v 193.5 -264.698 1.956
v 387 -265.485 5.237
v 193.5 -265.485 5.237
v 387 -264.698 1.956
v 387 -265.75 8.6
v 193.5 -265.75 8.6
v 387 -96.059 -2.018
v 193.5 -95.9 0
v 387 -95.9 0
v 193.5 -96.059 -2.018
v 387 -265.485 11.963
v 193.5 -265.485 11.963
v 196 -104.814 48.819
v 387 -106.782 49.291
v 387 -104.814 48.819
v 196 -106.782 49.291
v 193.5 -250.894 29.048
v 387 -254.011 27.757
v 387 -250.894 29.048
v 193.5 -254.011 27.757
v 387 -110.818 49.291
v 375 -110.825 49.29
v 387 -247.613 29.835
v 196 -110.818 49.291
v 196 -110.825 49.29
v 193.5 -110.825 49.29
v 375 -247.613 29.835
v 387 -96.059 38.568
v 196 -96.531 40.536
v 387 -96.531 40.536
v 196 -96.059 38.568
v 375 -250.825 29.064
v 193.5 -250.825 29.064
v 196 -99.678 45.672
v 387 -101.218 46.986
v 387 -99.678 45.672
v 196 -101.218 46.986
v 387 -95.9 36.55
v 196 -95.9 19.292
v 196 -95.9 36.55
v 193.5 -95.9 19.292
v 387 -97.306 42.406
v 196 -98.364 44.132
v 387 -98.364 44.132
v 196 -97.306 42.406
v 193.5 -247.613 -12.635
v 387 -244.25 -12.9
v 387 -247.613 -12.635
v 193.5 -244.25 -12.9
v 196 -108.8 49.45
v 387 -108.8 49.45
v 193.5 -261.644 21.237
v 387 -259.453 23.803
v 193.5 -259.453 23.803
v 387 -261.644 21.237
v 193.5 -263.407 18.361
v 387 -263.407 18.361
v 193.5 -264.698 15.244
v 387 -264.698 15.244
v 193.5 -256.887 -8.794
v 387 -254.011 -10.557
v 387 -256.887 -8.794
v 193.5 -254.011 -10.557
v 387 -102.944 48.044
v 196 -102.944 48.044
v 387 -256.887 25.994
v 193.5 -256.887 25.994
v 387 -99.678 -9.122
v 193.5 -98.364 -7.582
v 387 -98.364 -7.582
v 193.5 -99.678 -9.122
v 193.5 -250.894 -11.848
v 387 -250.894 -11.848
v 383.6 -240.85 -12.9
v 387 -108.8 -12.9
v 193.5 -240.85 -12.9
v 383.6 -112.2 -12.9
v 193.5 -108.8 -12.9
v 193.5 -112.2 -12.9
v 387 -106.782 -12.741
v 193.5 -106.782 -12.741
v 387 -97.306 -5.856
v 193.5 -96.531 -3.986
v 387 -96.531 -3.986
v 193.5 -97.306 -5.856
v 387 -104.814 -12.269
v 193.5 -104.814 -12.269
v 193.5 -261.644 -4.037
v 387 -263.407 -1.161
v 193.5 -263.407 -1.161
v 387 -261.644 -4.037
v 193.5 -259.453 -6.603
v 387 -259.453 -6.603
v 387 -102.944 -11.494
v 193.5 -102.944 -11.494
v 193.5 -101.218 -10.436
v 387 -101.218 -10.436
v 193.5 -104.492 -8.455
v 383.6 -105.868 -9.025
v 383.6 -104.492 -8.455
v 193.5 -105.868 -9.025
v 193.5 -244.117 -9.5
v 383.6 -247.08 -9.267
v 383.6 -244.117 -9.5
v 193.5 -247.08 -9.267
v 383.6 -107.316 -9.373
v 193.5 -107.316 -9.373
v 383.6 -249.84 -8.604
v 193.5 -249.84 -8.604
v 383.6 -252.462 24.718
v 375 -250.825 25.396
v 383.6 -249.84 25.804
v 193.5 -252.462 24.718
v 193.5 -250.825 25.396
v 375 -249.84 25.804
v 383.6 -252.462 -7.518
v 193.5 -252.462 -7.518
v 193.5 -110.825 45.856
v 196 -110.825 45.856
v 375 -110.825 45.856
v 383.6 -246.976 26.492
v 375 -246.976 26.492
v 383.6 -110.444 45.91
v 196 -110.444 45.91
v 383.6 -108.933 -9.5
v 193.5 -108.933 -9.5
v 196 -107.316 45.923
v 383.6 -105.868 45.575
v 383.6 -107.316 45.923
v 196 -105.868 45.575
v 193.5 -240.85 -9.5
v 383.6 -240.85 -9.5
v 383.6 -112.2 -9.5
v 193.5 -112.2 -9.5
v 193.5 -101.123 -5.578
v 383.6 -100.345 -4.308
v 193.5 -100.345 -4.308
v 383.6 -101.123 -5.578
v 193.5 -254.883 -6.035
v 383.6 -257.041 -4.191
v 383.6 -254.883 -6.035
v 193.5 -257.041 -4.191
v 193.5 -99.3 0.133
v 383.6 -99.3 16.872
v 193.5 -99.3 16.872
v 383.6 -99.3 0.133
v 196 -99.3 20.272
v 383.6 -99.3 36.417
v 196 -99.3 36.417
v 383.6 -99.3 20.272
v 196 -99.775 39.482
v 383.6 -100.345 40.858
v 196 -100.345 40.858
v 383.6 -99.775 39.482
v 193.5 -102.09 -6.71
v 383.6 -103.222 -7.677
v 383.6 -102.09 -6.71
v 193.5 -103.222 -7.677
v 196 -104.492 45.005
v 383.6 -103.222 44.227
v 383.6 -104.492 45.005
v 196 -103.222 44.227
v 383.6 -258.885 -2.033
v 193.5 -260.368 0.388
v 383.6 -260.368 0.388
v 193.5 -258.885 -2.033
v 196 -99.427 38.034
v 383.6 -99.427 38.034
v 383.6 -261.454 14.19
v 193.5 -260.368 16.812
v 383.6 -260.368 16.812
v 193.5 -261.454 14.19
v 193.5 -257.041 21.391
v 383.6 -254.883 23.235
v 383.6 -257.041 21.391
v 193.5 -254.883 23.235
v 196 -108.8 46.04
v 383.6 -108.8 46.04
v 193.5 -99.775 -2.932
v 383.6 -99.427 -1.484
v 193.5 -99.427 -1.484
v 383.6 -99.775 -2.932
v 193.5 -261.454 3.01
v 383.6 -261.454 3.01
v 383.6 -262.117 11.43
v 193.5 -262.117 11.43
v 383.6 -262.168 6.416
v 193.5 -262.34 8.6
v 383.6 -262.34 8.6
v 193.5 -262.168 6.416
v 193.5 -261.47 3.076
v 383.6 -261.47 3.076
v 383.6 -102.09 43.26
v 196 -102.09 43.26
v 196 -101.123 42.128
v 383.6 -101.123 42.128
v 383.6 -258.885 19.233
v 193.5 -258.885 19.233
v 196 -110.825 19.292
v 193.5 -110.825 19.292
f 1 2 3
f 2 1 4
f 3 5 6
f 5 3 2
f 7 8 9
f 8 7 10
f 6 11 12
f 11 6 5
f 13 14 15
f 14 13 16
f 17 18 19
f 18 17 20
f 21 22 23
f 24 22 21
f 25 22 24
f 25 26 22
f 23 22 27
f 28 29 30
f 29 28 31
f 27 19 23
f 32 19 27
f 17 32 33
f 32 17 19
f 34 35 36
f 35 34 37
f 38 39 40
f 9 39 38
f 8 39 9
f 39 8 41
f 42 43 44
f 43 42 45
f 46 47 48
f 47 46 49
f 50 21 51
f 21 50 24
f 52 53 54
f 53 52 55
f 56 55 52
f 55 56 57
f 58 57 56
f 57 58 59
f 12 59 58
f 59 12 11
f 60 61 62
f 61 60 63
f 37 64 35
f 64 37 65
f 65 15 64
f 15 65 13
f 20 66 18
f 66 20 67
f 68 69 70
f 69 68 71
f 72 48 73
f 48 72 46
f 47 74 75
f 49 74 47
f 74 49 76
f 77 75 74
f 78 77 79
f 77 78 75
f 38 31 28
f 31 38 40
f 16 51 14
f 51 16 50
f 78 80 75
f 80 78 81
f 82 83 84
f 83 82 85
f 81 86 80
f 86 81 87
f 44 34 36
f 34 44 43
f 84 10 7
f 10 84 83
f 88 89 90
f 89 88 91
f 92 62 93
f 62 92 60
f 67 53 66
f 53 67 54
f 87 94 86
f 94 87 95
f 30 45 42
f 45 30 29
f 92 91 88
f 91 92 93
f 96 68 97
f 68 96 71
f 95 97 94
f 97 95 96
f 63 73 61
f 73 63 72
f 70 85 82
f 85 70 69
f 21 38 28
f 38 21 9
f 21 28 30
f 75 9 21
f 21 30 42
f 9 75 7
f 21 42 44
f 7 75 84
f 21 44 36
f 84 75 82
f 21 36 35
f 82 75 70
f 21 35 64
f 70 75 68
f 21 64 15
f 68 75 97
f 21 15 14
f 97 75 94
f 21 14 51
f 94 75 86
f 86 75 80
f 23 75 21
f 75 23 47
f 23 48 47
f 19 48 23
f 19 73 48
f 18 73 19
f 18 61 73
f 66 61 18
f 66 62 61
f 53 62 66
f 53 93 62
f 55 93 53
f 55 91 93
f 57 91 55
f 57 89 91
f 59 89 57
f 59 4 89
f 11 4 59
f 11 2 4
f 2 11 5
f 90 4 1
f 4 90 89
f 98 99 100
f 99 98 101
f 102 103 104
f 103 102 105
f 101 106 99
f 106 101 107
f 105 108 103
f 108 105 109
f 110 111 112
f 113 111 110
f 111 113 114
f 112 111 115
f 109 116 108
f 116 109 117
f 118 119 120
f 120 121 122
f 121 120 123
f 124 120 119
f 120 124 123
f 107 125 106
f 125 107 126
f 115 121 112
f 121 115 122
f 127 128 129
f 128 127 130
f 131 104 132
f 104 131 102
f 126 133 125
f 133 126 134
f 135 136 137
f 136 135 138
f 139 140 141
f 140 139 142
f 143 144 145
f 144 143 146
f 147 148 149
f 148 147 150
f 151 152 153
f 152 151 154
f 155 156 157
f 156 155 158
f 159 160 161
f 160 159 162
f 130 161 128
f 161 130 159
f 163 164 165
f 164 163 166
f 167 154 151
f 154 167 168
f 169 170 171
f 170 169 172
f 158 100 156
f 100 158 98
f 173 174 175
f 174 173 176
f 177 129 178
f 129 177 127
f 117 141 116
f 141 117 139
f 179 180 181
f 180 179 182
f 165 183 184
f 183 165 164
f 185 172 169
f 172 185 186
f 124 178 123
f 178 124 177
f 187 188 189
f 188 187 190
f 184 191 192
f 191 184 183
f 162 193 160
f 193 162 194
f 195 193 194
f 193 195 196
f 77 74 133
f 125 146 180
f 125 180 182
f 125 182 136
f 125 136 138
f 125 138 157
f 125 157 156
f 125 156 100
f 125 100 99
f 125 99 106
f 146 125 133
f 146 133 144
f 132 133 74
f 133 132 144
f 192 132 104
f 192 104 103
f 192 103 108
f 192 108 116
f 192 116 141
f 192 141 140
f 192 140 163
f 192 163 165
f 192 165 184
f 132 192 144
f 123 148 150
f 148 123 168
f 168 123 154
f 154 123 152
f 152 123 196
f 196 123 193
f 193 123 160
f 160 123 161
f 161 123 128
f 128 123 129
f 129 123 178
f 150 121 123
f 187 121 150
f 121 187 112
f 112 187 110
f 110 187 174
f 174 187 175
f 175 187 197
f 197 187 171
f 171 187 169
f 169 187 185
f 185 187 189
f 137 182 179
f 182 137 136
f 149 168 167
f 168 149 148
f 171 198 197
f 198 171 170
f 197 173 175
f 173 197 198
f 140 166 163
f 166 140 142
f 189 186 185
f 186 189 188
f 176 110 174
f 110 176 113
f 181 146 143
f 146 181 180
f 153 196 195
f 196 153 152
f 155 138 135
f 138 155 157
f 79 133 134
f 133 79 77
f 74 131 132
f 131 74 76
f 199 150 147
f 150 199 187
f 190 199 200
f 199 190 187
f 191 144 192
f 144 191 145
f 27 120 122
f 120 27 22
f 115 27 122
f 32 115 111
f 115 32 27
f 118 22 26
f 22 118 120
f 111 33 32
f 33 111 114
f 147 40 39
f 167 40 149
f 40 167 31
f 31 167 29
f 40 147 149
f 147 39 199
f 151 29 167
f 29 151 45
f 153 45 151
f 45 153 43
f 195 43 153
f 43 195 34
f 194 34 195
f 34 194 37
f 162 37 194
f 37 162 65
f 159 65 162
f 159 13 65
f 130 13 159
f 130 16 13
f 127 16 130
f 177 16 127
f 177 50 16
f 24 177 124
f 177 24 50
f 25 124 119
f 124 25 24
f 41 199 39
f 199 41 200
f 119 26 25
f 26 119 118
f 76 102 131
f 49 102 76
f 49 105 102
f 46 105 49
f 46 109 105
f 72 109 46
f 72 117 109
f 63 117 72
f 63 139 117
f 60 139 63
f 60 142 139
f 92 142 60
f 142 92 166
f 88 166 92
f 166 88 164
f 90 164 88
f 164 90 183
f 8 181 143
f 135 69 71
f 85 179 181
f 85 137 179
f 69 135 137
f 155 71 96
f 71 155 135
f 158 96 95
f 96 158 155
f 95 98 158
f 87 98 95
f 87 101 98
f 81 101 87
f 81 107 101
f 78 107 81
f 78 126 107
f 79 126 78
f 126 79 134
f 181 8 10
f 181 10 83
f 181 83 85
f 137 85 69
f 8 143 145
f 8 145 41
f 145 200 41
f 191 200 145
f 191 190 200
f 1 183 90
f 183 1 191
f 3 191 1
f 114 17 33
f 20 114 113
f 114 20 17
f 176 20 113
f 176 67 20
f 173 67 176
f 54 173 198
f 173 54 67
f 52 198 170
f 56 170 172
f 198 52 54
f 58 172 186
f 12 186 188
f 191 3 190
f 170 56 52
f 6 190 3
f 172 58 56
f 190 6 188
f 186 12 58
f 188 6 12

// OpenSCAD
$fn=40;

//Header include modules here
//include <module.scad>;

// ---------------------------------------------------------------------------
// What to build.  "assembly" for the screen, the rest for exporting STLs.
// ---------------------------------------------------------------------------
// "assembly" | "case" (all four quadrants) | "whole" (the shell unsplit,
// for checking) | "lowerleft" | "lowerright" | "upperleft" | "upperright"
// | "bezel" | "panel" | "keyboard" | "kbleft" | "kbright"
part = "assembly";

// Parts are built where they live in the case, and the rear face leans back
// 0.513 deg, so the access door comes out as a flat plate that is not square to
// any axis.  Export it as-is, stand it up with a plain 90 deg rotation in the
// slicer, and one edge ends up 1.88mm off the bed.  Set this true when you go to
// print the door and it comes out lying on the bed, outer face down.
layFlat = false;

// Either selector on its own will isolate a part -- they do the same job.
// part = ...          picks a part by name
// current_color = ... picks it by the filament it prints in
//current_color = "ALL";     // everything
//current_color = "gray";    // shell, lower left
//current_color = "green";   // shell, lower right
//current_color = "blue";    // shell, upper left
//current_color = "red";     // shell, upper right
//current_color = "black";   // the screen bezel
//current_color = "white";   // the rear access door
//current_color = "orange";  // keyboard, left half
current_color = "yellow";  // keyboard, right half
// left/right are as you look at the front.  Set all four of quadColor at the
// bottom to "gray" if you want a plain preview instead of the harlequin.

//User Variables
scaleFactor = 4.3;

// Wall thickness, in FINAL mm, even all over.  3.4 is what the front wall
// happened to be before, so the bezel and its detent balls are unaffected.
wallThickness = 3.4;

// The screen aperture, in FINAL mm.  Note this is NOT an un scaled up
// dimension like the ones below it -- measure the panel and type the number
// straight in.  (It used to be [50, 36.5] un scaled up, i.e. 215 x 156.95.)
screenSize = [213, 160];       // viewable area of the LCD

// The circles the main profile is hulled from, un scaled up, as [depth, height].
// A face of the shape is the common tangent of two of these, so moving one moves
// a whole surface -- everything in "Derived" below is worked out from them.
//
// cRearTop used to be at 23, which put the back 0.51 deg off vertical: for a
// tangent to be vertical both circles have to reach the same depth, and
// 23 + 5.5 = 28.5 fell 0.5 short of 26 + 3 = 29.  At 23.5 the back is square to
// the base.  (Widening it to r = 6 at x = 23 would do the same job, but that
// changes the top rear corner radius, and 5.5 matches the front top corner.)
rSmall    = 3;
rBig      = 5.5;
cFrontBot = [  0,    0];
cRearBot  = [ 26,    0];
cRearTop  = [ 23.5, 56];
cFrontTop = [  0,   60];
cNose     = [-10,  15.5];

// un scaled up description of the opening in the front of the case.  The case
// cuts this out, the bezel is built to fill it back in, so both have to agree.
bezelSize     = [56, 25, 56];        // x = width, y = depth of the cutter, z = height
bezelPosition = [(56 / 2) + 6, 0, 45];
bezelRadius   = 5.5;                 // corner rounding of the opening
bezelTilt     = -10;                 // rake of the front face

// ---------------------------------------------------------------------------
// Everything below here is in FINAL mm, not un scaled up units -- screws,
// detents and vent slots are real world sizes and should not follow
// scaleFactor.  They are placed off the surface frames in "Derived" below.
// ---------------------------------------------------------------------------

// --- bezel snap fit -------------------------------------------------------
bezelFit       = 0.2;    // gap all round so the bezel can actually go in
bezelBallR     = 1.0;    // detent balls on the sides of the bezel
bezelBallProud = 0.7;    // how far they stand out of the bezel edge
bezelBallSlack = 0.15;   // dimples in the chassis are this much bigger
bezelBallPadR  = 4.0;    // material added behind each dimple so it cannot blow out
bezelBallZ     = [-85, -40, 5];   // heights up the opening, in the opening's own frame

// --- vent slits (top, behind the bezel) -----------------------------------
ventSpan   = [21.5, 262.3];  // x range they cover
ventCount  = 40;
ventWidth  = 3;
ventLength = 24;

// --- rear access panel ----------------------------------------------------
accessSize     = [86, 190];  // the hole in the back
accessCentre   = [312, 116]; // x, z of that hole on the rear face
accessRadius   = 8;          // corner rounding
panelLip       = 10;         // how far the panel overlaps the hole all round
panelThickness = 3.5;
panelFit       = 0.25;       // gap round the panel in its rebate
frameThickness = 7;          // material added inside for the screws to bite into
frameMargin    = 8;          // how far that frame reaches past the panel
screwInset     = 5;          // screw centres, in from the panel edge
screwPilot     = 2.6;        // M3 self tapper
screwClear     = 3.4;
screwHeadDia   = 6.0;
screwHeadDepth = 1.6;

// --- what goes in the access panel ----------------------------------------
// All positions are on the panel, measured from the middle of it.  The panel
// is panelW x panelH (106 x 210), so x is +/-53 and z is +/-105, and its own
// four screws sit at (+/-48, +/-100).  Everything here also has to stay inside
// the hole in the case (+/-43, +/-95) or it will foul the lip.
// Everything sits in one row along the bottom, to keep the weight of the
// cables as low as possible -- this case is light and a lead hanging off the
// top of the panel would want to tip it over.  Both connectors are stood on
// end (Rotate = 90) so all three fit across the 86mm of usable width.
powerHoleDia  = 11;            // grommet / cable gland for the mains lead
powerHolePos  = [26, -72];

de9Pos        = [-26, -72];
de9Rotate     = 90;            // 90 stands the connector on end
de9CutTop     = 19.2;          // D-sub DE9 panel cutout, wide side
de9CutBottom  = 16.9;          //                         narrow side
de9CutHeight  = 12.55;
de9CutCorner  = 1;
de9ScrewPitch = 24.99;         // jackscrew centres -- this one is a real standard
de9ScrewDia   = 3.2;

usbPos        = [0, -72];
usbRotate     = 90;
usbCut        = [14.5, 7.5];   // the opening itself -- MEASURE YOURS, no standard
usbCutCorner  = 1;
usbScrewPitch = 29.5;          // mounting holes, on the connector's long axis
usbScrewDia   = 3.5;

// --- keyboard ---------------------------------------------------------------
// Measured off the same drawing as the terminal, so these are un scaled up
// units like the profile circles at the top, NOT final mm.
//
// The front and rear corners are NOT the same radius.  The front is 5, and the
// front is 10 tall -- exactly one of those circles -- so both front corners land
// on the same centre and the nose is a true half round.  The rear corners are 3,
// the terminal's own bottom corner radius.
kbRadiusF = 5;             //       -> 21.50 radius, the two front corners
kbRadiusR = rSmall;        //  3    -> 12.90 radius, the two rear corners
kbFrontH  = 2 * kbRadiusF; // 10    -> 43.00 tall, one full circle
kbRearH   = 14.5;          //       -> 62.35 tall
kbDepth   = 39.5;          //       -> 169.85 front to back
kbWidth   = 90;            //       -> 387.00, same as the terminal

kbGap        = 40;         // FINAL mm, terminal's nose to the keyboard's back
kbOpenBottom = true;       // leave the underside open

// The recess the real keyboard drops into.  FINAL mm, not drawing units.
// kbPocketZ is how DEEP the cut is, measured straight down from the plane of the
// top face, at the pocket's front edge and at its rear edge.  (If those 22 / 30
// were meant as floor heights above the base instead, set kbPocketFromTop=false.)
kbPocket      = [363, 140];   // width x depth
kbPocketZ     = [22, 30];     // depth of the cut at the front / at the back
kbPocketFromTop = true;
kbFloor       = wallThickness; // the plate the keyboard sits on
kbCordW       = 5;             // slit down the back centre for the lead

// Halved for the printer.  Same glue strip idea as the terminal: a backing
// strip lapping the seam, tabFlange thick, with tabGlue of clearance.
kbSplit = kbWidth * scaleFactor / 2;

// --- splitting the shell into four -----------------------------------------
// The case is 387 x 294.55 overall (x 0..387, z -12.9..281.65), so these are
// the dead centre of each.  Move them if you would rather put a seam somewhere
// less awkward -- see the note about the access door in the comments below.
splitX = 193.5;
splitZ = 134.375;

// Glue tabs: a strip lying against the inside of the wall that laps across the
// seam into the next piece.  Nothing to fit or clip together, it is just a
// backing strip to spread the glue joint and line the halves up.
tabReach   = 12;      // how far the strip runs either side of the seam
tabFlange  = 2.5;     // how thick the strip is -- even everywhere now
tabGlue    = 0.15;    // glue gap between the lapping half and the next piece
tabClear   = 0.4;     // gap where the two seams cross, so the strips miss

// Both connectors get the panel thinned behind them, otherwise a D-sub shell
// or a USB coupler cannot reach through 3.5mm of plastic.
padLeft       = 2;             // thickness the panel is left at
de9PadSize    = [42, 27];      // long axis first -- the Rotate above turns it
usbPadSize    = [40, 14];      // what the USB housing needs to drop into
padCorner     = 3;

//Derived Variables

// The bezel opening, in mm, in its own tilted frame.
bezelHalfW = bezelSize[0] / 2 * scaleFactor;   // 120.4
bezelHalfH = bezelSize[2] / 2 * scaleFactor;   // 120.4

// --- surface planes, worked out from the hull circles ----------------------
// Where two circles of DIFFERENT radii meet a common tangent, the normal is
// not perpendicular to their centre line -- it is swung round by
// acos((r2-r1)/L).  Offsetting both centres along the same perpendicular (the
// obvious thing to do, and what I had here as hard coded numbers) is only right
// when the radii match, and puts these planes out by over a tenth of a mm.
// `out` is the direction the face looks in, and picks which tangent we want.
// The normal returned points INTO the solid, so adding wallThickness * n to a
// face slides it to where the inside of the wall is.
function tangentNormal(c1, r1, c2, r2, out) =
    let (v   = c2 - c1,
         L   = norm(v),
         u   = v / L,
         w   = [-u[1], u[0]],
         cf  = (r2 - r1) / L,
         sf2 = sqrt(1 - cf * cf),
         a   = u * cf + w * sf2,
         b   = u * cf - w * sf2)
    ((a * out) < (b * out)) ? a : b;

function tangentSeg(c1, r1, c2, r2, out) =
    let (n = tangentNormal(c1, r1, c2, r2, out))
    [c1 - r1 * n, c2 - r2 * n];       // where it touches each circle

rearSeg  = tangentSeg(cRearBot,  rSmall, cRearTop,  rBig, [ 1, 0]);
topSeg   = tangentSeg(cFrontTop, rBig,   cRearTop,  rBig, [ 0, 1]);
frontSeg = tangentSeg(cNose,     rSmall, cFrontTop, rBig, [-1, 0]);

// The rear face.  With cRearTop at 23.5 this comes out dead vertical, so
// rearLean is 0 and the access door is square to the base.
rearLo   = rearSeg[0] * scaleFactor;
rearHi   = rearSeg[1] * scaleFactor;
rearLean = atan2(rearLo[0] - rearHi[0], rearHi[1] - rearLo[1]);
rearRefY = rearLo[0] + rearLo[1] * tan(rearLean);

// The flat top, falling away toward the back.  The bezel's top wrap ends at
// y = 68.09, so the vent slits live behind that.
topFront = topSeg[0] * scaleFactor;
topRear  = topSeg[1] * scaleFactor;
topSlope = atan2(topRear[1] - topFront[1], topRear[0] - topFront[0]);
topRefY  = 86.5;
topRefZ  = topFront[1] + (topRefY - topFront[0]) * tan(topSlope);

// A world line Y = k + m*Z, restated in the bezel opening's tilted frame as
// [y at z = 0, dy/dz].  Used to find the front wall so the detent balls can sit
// in the middle of it.
function lineInBezel(P1, P2) =
    let (m   = (P2[0] - P1[0]) / (P2[1] - P1[1]),
         k   = P1[0] - m * P1[1],
         Cz  = bezelPosition[2] * scaleFactor,
         t   = bezelTilt,
         den = cos(t) - m * sin(t))
    [(k + m * Cz) / den, (m * cos(t) + sin(t)) / den];

// the front wall: the outer face, and the same face slid in by the wall
frontN     = tangentNormal(cNose, rSmall, cFrontTop, rBig, [-1, 0]);
frontOuter = lineInBezel(frontSeg[0] * scaleFactor, frontSeg[1] * scaleFactor);
frontInner = lineInBezel(frontSeg[0] * scaleFactor + frontN * wallThickness,
                         frontSeg[1] * scaleFactor + frontN * wallThickness);

function bezelPlateY(z) = ((frontOuter[0] + frontOuter[1] * z) +
                           (frontInner[0] + frontInner[1] * z)) / 2;

// where the terminal's nose and its base sit, so the keyboard can line up
terminalFrontY = (cNose[0]     - rSmall) * scaleFactor;   // -55.90
terminalBaseZ  = (cFrontBot[1] - rSmall) * scaleFactor;   // -12.90

// --- keyboard, worked out in its own frame: x 0..387, y 0..169.85 back from the
// nose, z 0..62.35 up from the base ----------------------------------------
kbTopSeg   = tangentSeg([kbRadiusF, kbRadiusF], kbRadiusF,
                        [kbDepth - kbRadiusR, kbRearH - kbRadiusR], kbRadiusR, [0, 1]);
kbTopF     = kbTopSeg[0] * scaleFactor;    // 18.47, 42.79  where the flat top starts
kbTopR     = kbTopSeg[1] * scaleFactor;    // 155.13, 62.22  and where it ends
kbTopSlope = atan2(kbTopR[1] - kbTopF[1], kbTopR[0] - kbTopF[0]);   // 8.09 deg
function kbTopAt(y) = kbTopF[1] + (y - kbTopF[0]) * tan(kbTopSlope);

// pocket centred in both directions
kbPocketX = (kbWidth * scaleFactor - kbPocket[0]) / 2;    // 12.00
kbPocketY = (kbDepth * scaleFactor - kbPocket[1]) / 2;    // 14.92
kbPocketY2 = kbPocketY + kbPocket[1];

// the floor the keyboard sits on, as a plane through the front and rear edges
kbFloorF = kbPocketFromTop ? kbTopAt(kbPocketY)  - kbPocketZ[0] : kbPocketZ[0];
kbFloorR = kbPocketFromTop ? kbTopAt(kbPocketY2) - kbPocketZ[1] : kbPocketZ[1];
function kbFloorAt(y) = kbFloorF + (y - kbPocketY) * (kbFloorR - kbFloorF) / kbPocket[1];

panelW = accessSize[0] + 2 * panelLip;
panelH = accessSize[1] + 2 * panelLip;
screwX = panelW / 2 - screwInset;
screwZ = panelH / 2 - screwInset;

//modules
/* Similar to the color function, but can be used for generating multi-color models for printing.
 * The global current_color variable indicates the color to print.
 */
module multicolor(color) {
    if (current_color != "ALL" && current_color != color) {
        // ignore our children.
        // (I originally used "scale([0,0,0])" which also works but isn't needed.)
    } else {
        color(color)
        children();
    }
}

module radiusCube(x, y, z, r) {
    hull()
        for (i = [-1, 1], j = [-1, 1], k = [-1, 1])
            translate([i*(x/2 - r), j*(y/2 - r), k*(z/2 - r)])
                sphere(r = r);
}

// the box that opens up the front of the case for the screen bezel.  Used as a
// cutter by the case and as the body the bezel is carved out of.  shrink pulls
// the whole thing in evenly, which is how the bezel gets its running fit.
module bezelCutout(shrink = 0) {
    translate(bezelPosition)
        rotate([bezelTilt, 0, 0])
            // taking shrink off every dimension and half of it off the corner
            // radius offsets the whole box inward by shrink/2 -- the depth
            // matters too, that face is what the bezel's top wrap seats against.
            radiusCube(x = bezelSize[0] - shrink,
                       y = bezelSize[1] - shrink,
                       z = bezelSize[2] - shrink,
                       r = bezelRadius - shrink / 2);
}

// module to cut out the hole for the bezel
// bezelCut = false builds the same shape with the screen opening left solid.
// The cross section of the case, un scaled up.  The whole shape is a prism
// along the width, so a genuinely uniform wall is just a 2D offset of this plus
// pulling the two ends in -- no scaled copy, no Minkowski.
module sectionRaw() {
    difference() {
        // the main shape formed from hulling circles.
        hull(){
            translate(cFrontBot) circle(r = rSmall);
            translate(cRearBot)  circle(r = rSmall);   // rear bottom circle
            translate(cRearTop)  circle(r = rBig);     // rear top circle
            // translate([60,0]) circle(d = 6);        // rear bottom circle old facroy depth
            // translate([57,52]) circle(d = 11);      // rear top circle old factory depth
            translate(cFrontTop) circle(r = rBig);
            translate(cNose)     circle(r = rSmall);
        }
        // undercut the front to form the chin
        hull() {
            translate([ -6,  9.5]) circle(d = 6);
            translate([ -6, -3  ]) circle(d = 6);
            translate([-13,  9.5]) circle(d = 6);
            translate([-13, -3  ]) circle(d = 6);
        }
    }
}

module section(inset = 0) {
    if (inset == 0) sectionRaw();
    else            offset(r = -inset) sectionRaw();
}

// the chamfer down each side, as a 2D shape.  grow > 0 swells the cutter, which
// is what leaves a uniform wall behind it rather than a wedge.
bevelProfile = [[0, 0], [7.3, 0], [5, 17.5], [7.3, 73], [0, 73]];
module bevel(grow = 0) {
    if (grow == 0) polygon(points = bevelProfile);
    else           offset(r = grow) polygon(points = bevelProfile);
}

// inset > 0 gives the shape eroded evenly by that much, in un scaled up units.
// Eroding a difference means eroding the body and DILATING what was cut out of
// it, which is why bevel() gets grown by the same amount.
module mainExtrusion(extrudeWidth, bezelCut = true, inset = 0) {
    module pp() {
        rotate([90,0,90])
            translate([0, 0, inset])
                linear_extrude(height = extrudeWidth - 2*inset)
                    section(inset);
    }

    module nn() {
        // cut out bezel hole
        if (bezelCut) bezelCutout();

        // cut out side bevels
        rotate([90,0,0]) translate([-5,-3,-80]) linear_extrude(height = 100) bevel(inset);
        mirror([180,0,0]) rotate([90,0,0]) translate([-95,-3,-80]) linear_extrude(height = 100) bevel(inset);
    }
    difference() {
        pp();
        nn();
    }
}

//Put things you want to build here.
module positive(bezelCut = true){
    // draw main shape and scale it to a factor that the screen will fit in
    scale(scaleFactor) mainExtrusion(extrudeWidth = 90, bezelCut = bezelCut);
}

//Put cut outs here.
// The shape eroded evenly by `mm`.  This used to be a 0.97 scaled copy shifted
// a bit, which cannot give an even wall however you place it -- the gap grows
// with distance from the origin, so the wall ran 1.6mm at the back and 7.3mm on
// the right cheek, a 4.6x spread, and the glue flanges thinned out in the same
// places.  A real offset is even everywhere by construction.
module shapeInset(mm) {
    scale(scaleFactor)
        mainExtrusion(extrudeWidth = 90, bezelCut = false, inset = mm / scaleFactor);
}

module negative(){
    // cut out the interior.
    //
    // The bezel opening is deliberately NOT cut from this inner copy.  The
    // opening is a through hole in the outer shape, so eroding that shape
    // already leaves a proper wall all round it, and cutting the opening here
    // as well used to leave a slab of plastic floating loose in the cavity.
    shapeInset(wallThickness);
}

// the hollow case wall.  bezelCut = false keeps the screen opening filled in,
// which is the stock the bezel gets cut from.
module shell(bezelCut = true) {
    difference() {
        positive(bezelCut = bezelCut);
        negative();
    }
}

// ---------------------------------------------------------------------------
// working frames, all in mm
// ---------------------------------------------------------------------------

// the screen opening's own frame: origin at the centre of the opening,
// x across, y out toward the viewer, z up the face.
module atBezel() {
    translate(bezelPosition * scaleFactor) rotate([bezelTilt, 0, 0]) children();
}

// the flat part of the top, behind the bezel: y runs back down the slope,
// z is the outward normal, the surface is at z = 0.
module atTop() {
    translate([0, topRefY, topRefZ]) rotate([topSlope, 0, 0]) children();
}

// the rear face: y points out the back, the face is at y = 0.
module atRear() {
    translate([0, rearRefY, 0]) rotate([rearLean, 0, 0]) children();
}

// a rounded plate lying on the rear face, extruded from the face inward.
module rearSlab(w, h, depth, r) {
    rotate([90, 0, 0])
        linear_extrude(height = depth)
            hull() for (i = [-1, 1], j = [-1, 1])
                translate([i*(w/2 - r), j*(h/2 - r)]) circle(r = r);
}

// the access panel's own frame: origin in the middle of it, y out the back,
// x across and z up the panel.
module atPanel() {
    atRear() translate([accessCentre[0], 0, accessCentre[1]]) children();
}

// The exact inverse of atPanel, then tipped over: this lays the door flat on
// the bed, centred on the origin, OUTER face down.  That way the connector
// pockets and the thinned sections open upward and need no support, and only
// the four small screw counterbores have to bridge.
module panelForPrinting() {
    translate([-accessCentre[0], -accessCentre[1], 0])
        rotate([-90, 0, 0])
            rotate([-rearLean, 0, 0])
                translate([0, -rearRefY, 0])
                    children();
}

// take a 2D profile drawn in x/z and push it in from the rear face.
module rearExtrude(depth) {
    rotate([90, 0, 0]) linear_extrude(height = depth) children();
}

// a hole bored straight through the panel from outside
module panelBore(pos, d, depth = 20) {
    atPanel() translate([pos[0], 2, pos[1]])
        rotate([90, 0, 0]) cylinder(h = depth, d = d, $fn = 32);
}

// ---------------------------------------------------------------------------
// vent slits
// ---------------------------------------------------------------------------
module ventSlits() {
    pitch = (ventSpan[1] - ventSpan[0]) / ventCount;
    for (i = [0 : ventCount - 1])
        atTop()
            translate([ventSpan[0] + pitch/2 + i*pitch, 0, -30])
                linear_extrude(height = 40)
                    hull() {
                        translate([0,  ventLength/2 - ventWidth/2]) circle(d = ventWidth, $fn = 16);
                        translate([0, -ventLength/2 + ventWidth/2]) circle(d = ventWidth, $fn = 16);
                    }
}

// ---------------------------------------------------------------------------
// bezel detents: balls on the sides of the bezel, dimples in the chassis
// ---------------------------------------------------------------------------

// centre of each ball, in the opening's frame.  Sitting this far in means
// bezelBallProud of it stands out past the (already shrunk) bezel edge.
function ballCentre(side, z) =
    [side * (bezelHalfW - bezelFit - (bezelBallR - bezelBallProud)), bezelPlateY(z), z];

module bezelBallPositions() {
    for (side = [-1, 1], z = bezelBallZ)
        atBezel() translate(ballCentre(side, z)) children();
}

// the balls, clipped to the front wall so they can never break its faces
module bezelBalls() {
    intersection() {
        bezelBallPositions() sphere(r = bezelBallR, $fn = 24);
        shell(bezelCut = false);
    }
}

module bezelDimples() {
    bezelBallPositions() sphere(r = bezelBallR + bezelBallSlack, $fn = 24);
}

// a little extra meat behind each dimple.  Clipping against positive() keeps it
// from bulging out of the case or intruding into the opening.
module bezelDetentPads() {
    intersection() {
        for (side = [-1, 1], z = bezelBallZ)
            atBezel() translate([side * (bezelHalfW + 1.5), bezelPlateY(z), z])
                sphere(r = bezelBallPadR, $fn = 24);
        positive();
    }
}

// ---------------------------------------------------------------------------
// rear access panel
// ---------------------------------------------------------------------------
module accessOpening() {
    // Only deep enough to break through the rear wall and the frame behind it.
    // Do NOT just make this arbitrarily deep -- the case is ~180mm front to
    // back, so an over-long cutter comes straight out the front of the cheek.
    atRear() translate([accessCentre[0], 20, accessCentre[1]])
        rearSlab(accessSize[0], accessSize[1],
                 20 + panelThickness + frameThickness + 10, accessRadius);
}

module accessRebate() {
    atRear() translate([accessCentre[0], 50, accessCentre[1]])
        rearSlab(panelW, panelH, 50 + panelThickness, accessRadius);
}

// the raw block the frame is cut from.  grow > 0 gives an oversized copy, used
// to keep the seam tabs out of the frame's way.
module accessFrameStock(grow = 0) {
    atRear() translate([accessCentre[0], grow, accessCentre[1]])
        rearSlab(panelW + 2*frameMargin + 2*grow, panelH + 2*frameMargin + 2*grow,
                 panelThickness + frameThickness + 2*grow, accessRadius + frameMargin + grow);
}

// local thickening on the inside of the rear wall for the screws to bite into
module accessFrame() {
    intersection() {
        accessFrameStock();
        positive();
    }
}

// --- what mounts in the access panel ---------------------------------------

// the pair of mounting holes either side of a connector, on its long axis
module connectorScrews(pos, ang, pitch, d) {
    for (i = [-1, 1])
        panelBore([pos[0] + i * pitch/2 * cos(ang),
                   pos[1] + i * pitch/2 * sin(ang)], d);
}

// D shaped, so the connector only goes in one way round.
module de9Cutout() {
    atPanel() translate([de9Pos[0], 2, de9Pos[1]])
        rearExtrude(20)
            rotate(de9Rotate)
                hull() for (i = [-1, 1]) {
                    translate([i*(de9CutTop/2    - de9CutCorner),
                                de9CutHeight/2 - de9CutCorner]) circle(r = de9CutCorner);
                    translate([i*(de9CutBottom/2 - de9CutCorner),
                               -de9CutHeight/2 + de9CutCorner]) circle(r = de9CutCorner);
                }
    connectorScrews(de9Pos, de9Rotate, de9ScrewPitch, de9ScrewDia);
}

module usbCutout() {
    atPanel() translate([usbPos[0], 2, usbPos[1]])
        rearExtrude(20)
            rotate(usbRotate)
                hull() for (i = [-1, 1], j = [-1, 1])
                    translate([i*(usbCut[0]/2 - usbCutCorner), j*(usbCut[1]/2 - usbCutCorner)])
                        circle(r = usbCutCorner);
    if (usbScrewPitch > 0)
        connectorScrews(usbPos, usbRotate, usbScrewPitch, usbScrewDia);
}

// pockets on the INSIDE of the panel, so the outside stays flush but the
// connectors only have padLeft of plastic to get their shells through.
module connectorPads() {
    for (p = [[de9Pos, de9PadSize, de9Rotate], [usbPos, usbPadSize, usbRotate]])
        atPanel() translate([p[0][0], -padLeft, p[0][1]])
            rearExtrude(20)
                rotate(p[2])
                    hull() for (i = [-1, 1], j = [-1, 1])
                        translate([i*(p[1][0]/2 - padCorner), j*(p[1][1]/2 - padCorner)])
                            circle(r = padCorner);
}

// four holes on the panel corners.  from/len are along the rear face normal.
module accessScrews(d, from, len) {
    for (i = [-1, 1], j = [-1, 1])
        atRear() translate([accessCentre[0] + i*screwX, from, accessCentre[1] + j*screwZ])
            rotate([90, 0, 0]) cylinder(h = len, d = d, $fn = 24);
}

// ---------------------------------------------------------------------------
// the parts
// ---------------------------------------------------------------------------
module vt100Case() {
    difference() {
        union() {
            shell(bezelCut = true);
            accessFrame();
            bezelDetentPads();
        }
        accessRebate();
        accessOpening();
        accessScrews(screwPilot, 1, panelThickness + frameThickness + 3);
        bezelDimples();
        ventSlits();
    }
}

// ---------------------------------------------------------------------------
// splitting the shell into four, with glue tabs
// ---------------------------------------------------------------------------

// The screen opening's outline swept straight back down its own axis.  Used to
// trim the glue strips instead of the rounded box itself: that box's corner
// rounding runs almost parallel to the front wall where it passes through, so it
// sliced the strips at a glancing angle and feathered them away to nothing.  A
// prism cuts them square, at 0.5 deg off the wall normal, so the strip keeps its
// full thickness right up to its edge.
// It has to STOP at the back of the opening.  Run it the whole depth of the
// case and it carries on through the rear wall and deletes the strip up the
// back, which is nothing to do with the screen opening.
module bezelPrism(grow = 0) {
    back = bezelSize[1] / 2 * scaleFactor + grow;   // the opening's own rear face
    translate(bezelPosition * scaleFactor)
        rotate([bezelTilt, 0, 0])
            rotate([90, 0, 0])
                translate([0, 0, -back])
                    linear_extrude(height = 400 + back)
                        offset(r = grow)
                            hull() for (i = [-1, 1], j = [-1, 1])
                                translate([i * (bezelHalfW - bezelRadius * scaleFactor),
                                           j * (bezelHalfH - bezelRadius * scaleFactor)])
                                    circle(r = bezelRadius * scaleFactor);
}

// big half spaces.  the model lives inside x 0..387, y -56..125, z -13..282.
module slabX(a, b) { translate([a, -600, -600]) cube([b - a, 1400, 1400]); }
module slabZ(a, b) { translate([-600, -600, a]) cube([1400, 1400, b - a]); }

// a layer lying against the inside of the cavity wall.  Because the hollowing
// is done by scaling, this comes out a little thicker far from the origin than
// near it -- for a glue tab that does not matter.
module wallLayer(fromWall) {
    difference() {
        shapeInset(fromWall);
        shapeInset(wallThickness + tabFlange);
    }
}

// ...trimmed out of every opening, so no tab ever floats across the screen
// hole or the access hole, blocks a vent, or fights with the access frame.
module tabStock(fromWall) {
    difference() {
        wallLayer(fromWall);
        bezelPrism(tabClear);
        accessOpening();
        accessFrameStock(tabClear);
        ventSlits();
    }
}

// A seam strip is flush with the wall on its own side, so it welds onto its
// own piece, and inset by the glue gap where it laps into the neighbour.
module seamStrip(axis) {
    union() {
        intersection() {
            tabStock(wallThickness);
            if (axis == "x") slabX(splitX - tabReach, splitX);
            else             slabZ(splitZ - tabReach, splitZ);
        }
        intersection() {
            tabStock(wallThickness + tabGlue);
            if (axis == "x") slabX(splitX, splitX + tabReach);
            else             slabZ(splitZ, splitZ + tabReach);
        }
    }
}

// the vertical seam's strip belongs to the -x side and laps into +x
module xSeamTab() { seamStrip("x"); }

// the horizontal seam's strip belongs to the -z side and laps into +z, notched
// where the vertical strip crosses it so the two never claim the same space
module zSeamTab() {
    difference() {
        seamStrip("z");
        slabX(splitX - tabReach - tabClear, splitX + tabReach + tabClear);
    }
}

// sx, sz say which side of each seam this quadrant is on.  A quadrant carries
// the strip for a seam only when it is on the -ve side of it, so the lower left
// piece carries both, the upper right carries neither.
module quadrant(sx, sz) {
    xlo = (sx < 0) ? -600 : splitX;   xhi = (sx < 0) ? splitX : 800;
    zlo = (sz < 0) ? -600 : splitZ;   zhi = (sz < 0) ? splitZ : 800;
    union() {
        intersection() {
            vt100Case();
            slabX(xlo, xhi);
            slabZ(zlo, zhi);
        }
        if (sx < 0) intersection() { xSeamTab(); slabZ(zlo, zhi); }
        if (sz < 0) intersection() { zSeamTab(); slabX(xlo, xhi); }
    }
}

// ---------------------------------------------------------------------------
// keyboard
// ---------------------------------------------------------------------------

// the side profile, in the same [depth, height] frame the terminal section uses
module kbSectionRaw() {
    hull() {
        translate([kbRadiusF,           kbRadiusF            ]) circle(r = kbRadiusF);
        translate([kbRadiusF,           kbFrontH - kbRadiusF ]) circle(r = kbRadiusF);
        translate([kbDepth - kbRadiusR, kbRadiusR            ]) circle(r = kbRadiusR);
        translate([kbDepth - kbRadiusR, kbRearH  - kbRadiusR ]) circle(r = kbRadiusR);
    }
}

module kbSection(inset = 0) {
    if (inset == 0) kbSectionRaw();
    else            offset(r = -inset) kbSectionRaw();
}

// extruded across the width, same trick and same even wall as the terminal
module kbBody(inset = 0) {
    rotate([90, 0, 90])
        translate([0, 0, inset])
            linear_extrude(height = kbWidth - 2 * inset)
                kbSection(inset);
}

// the shape eroded evenly by `mm`, in the keyboard's own final-mm frame
module kbSolid(mm) { scale(scaleFactor) kbBody(mm / scaleFactor); }

// puts the keyboard's own frame where it belongs, in front of the terminal
module atKeyboard() {
    translate([0, terminalFrontY - kbGap - kbDepth * scaleFactor, terminalBaseZ])
        children();
}

// a profile drawn in [depth, height] and swept across the width
module kbSweep(x0, len) {
    translate([x0, 0, 0]) rotate([90, 0, 90]) linear_extrude(height = len) children();
}

// the recess, from the floor plane straight up and out through the top
module kbPocketCut() {
    kbSweep(kbPocketX, kbPocket[0])
        polygon([[kbPocketY,  kbFloorAt(kbPocketY) ],
                 [kbPocketY2, kbFloorAt(kbPocketY2)],
                 [kbPocketY2, 300],
                 [kbPocketY,  300]]);
}

// the plate the keyboard rests on, kbFloor thick, carried right across inside
module kbFloorPlate() {
    intersection() {
        kbSolid(wallThickness);
        kbSweep(0, kbWidth * scaleFactor)
            polygon([[-100, kbFloorAt(-100) - kbFloor],
                     [ 400, kbFloorAt( 400) - kbFloor],
                     [ 400, kbFloorAt( 400)],
                     [-100, kbFloorAt(-100)]]);
    }
}

// Slit down the back centre for the lead.  It stops at the underside of the
// board, i.e. the pocket floor -- run it to the base of the case instead and it
// saws through the floor plate and the glue strip below it, leaving both hanging
// either side of a slot that serves no purpose.
module kbCordCut() {
    z0 = kbFloorAt(kbPocketY2);
    translate([(kbWidth * scaleFactor - kbCordW)/2, kbPocketY2, z0])
        cube([kbCordW,
              kbDepth * scaleFactor - kbPocketY2 + 10,
              kbRearH * scaleFactor + 20 - z0]);
}

module keyboardShell() {
    w = wallThickness;
    difference() {
        union() {
            difference() {
                kbSolid(0);
                kbSolid(w);
                // Open the underside, over the flat part of the base only --
                // carried out to the nose the front wall thins to a knife edge
                // where the outer radius curves away.
                if (kbOpenBottom)
                    translate([w, kbRadiusF * scaleFactor + w, -1])
                        cube([kbWidth * scaleFactor - 2*w,
                              (kbDepth - kbRadiusF - kbRadiusR) * scaleFactor - 2*w,
                              1 + w]);
            }
            kbFloorPlate();
        }
        kbPocketCut();
        kbCordCut();
    }
}

// a slab lying under the floor plate, so the plate gets a lapped glue joint too
// rather than a bare butt down the middle of the tray the keyboard sits on
module kbUnderPlate(gap) {
    intersection() {
        kbSolid(wallThickness);
        kbSweep(0, kbWidth * scaleFactor)
            polygon([[-100, kbFloorAt(-100) - kbFloor - tabFlange],
                     [ 400, kbFloorAt( 400) - kbFloor - tabFlange],
                     [ 400, kbFloorAt( 400) - kbFloor - gap],
                     [-100, kbFloorAt(-100) - kbFloor - gap]]);
    }
}

// Glue strip lapping the seam, same idea as the terminal: flush with the wall on
// its own side so it welds on, dropped by `gap` where it laps into the other
// half.  The gap has to apply to the floor plate as well as the walls -- take it
// off only the walls and the strip drives straight through the other half's
// floor.
// The slit sits dead centre on the seam, so it cuts the glue strip in two and
// the half beyond it hangs off nothing but a wrap under the slit -- a free fin
// standing next to the opening.  Keep the strip out of the slit's region
// altogether; it carries on below the slit and right round the rest of the loop.
// It starts tabClear ahead of the pocket's rear face and tabClear below the
// pocket floor, so none of its faces land on a plane a different cutter already
// uses -- coincident cutter faces there leave non-manifold edges in the export.
// The overlap into the pocket costs nothing, the strip is already gone in there.
module kbCordKeepOut() {
    z0 = kbFloorAt(kbPocketY2) - tabClear;
    translate([kbSplit - tabReach - tabClear, kbPocketY2 - tabClear, z0])
        cube([2 * (tabReach + tabClear),
              kbDepth * scaleFactor - kbPocketY2 + 10,
              kbRearH * scaleFactor + 20 - z0]);
}

// the band the floor plate occupies, grown by `grow`
module kbPlateBand(grow) {
    kbSweep(0, kbWidth * scaleFactor)
        polygon([[-100, kbFloorAt(-100) - kbFloor - grow],
                 [ 400, kbFloorAt( 400) - kbFloor - grow],
                 [ 400, kbFloorAt( 400) + grow],
                 [-100, kbFloorAt(-100) + grow]]);
}

module kbSeamStrip(gap, dodgePlate) {
    difference() {
        union() {
            difference() {
                kbSolid(wallThickness + gap);
                kbSolid(wallThickness + tabFlange);
                // On the half that laps into its neighbour the wall layer has to
                // stand clear of THAT half's floor plate, or it drives straight
                // through it.  On its own side it just merges, so leave it.
                if (dodgePlate) kbPlateBand(gap);
            }
            kbUnderPlate(gap);
        }
        kbPocketCut();
        kbCordKeepOut();   // a superset of kbCordCut, across the whole strip
    }
}

module kbSeamTab() {
    union() {
        intersection() { kbSeamStrip(0,       false); slabX(kbSplit - tabReach, kbSplit); }
        intersection() { kbSeamStrip(tabGlue, true);  slabX(kbSplit, kbSplit + tabReach); }
    }
}

// side < 0 is the left half, and carries the strip
module keyboardHalf(side) {
    atKeyboard() union() {
        intersection() {
            keyboardShell();
            slabX(side < 0 ? -600 : kbSplit, side < 0 ? kbSplit : 800);
        }
        if (side < 0) kbSeamTab();
    }
}

module accessPanel() {
    difference() {
        intersection() {
            atRear() translate([accessCentre[0], 50, accessCentre[1]])
                rearSlab(panelW - 2*panelFit, panelH - 2*panelFit,
                         50 + panelThickness, accessRadius - panelFit);
            union() {
                shell(bezelCut = true);
                accessFrame();
            }
        }
        accessScrews(screwClear, 1, panelThickness + 2);
        accessScrews(screwHeadDia, 1, 1 + screwHeadDepth);
        connectorPads();
        de9Cutout();
        usbCutout();
        panelBore(powerHolePos, powerHoleDia);
    }
}

// the screen aperture, in the bezel's own frame: centred left to right, and
// lifted off the bottom of the opening by the same margin it has at the sides.
module screenHole() {
    sideMargin = (2 * bezelHalfW - screenSize[0]) / 2;
    zOffset    = -bezelHalfH + sideMargin + screenSize[1] / 2;

    atBezel() translate([0, 0, zOffset])
        cube([screenSize[0], bezelSize[1] * scaleFactor * 3, screenSize[1]], center = true);
}

// the black bezel: the plug that fills the opening the case cuts out, pulled in
// by bezelFit so it will go in, with the screen aperture taken back out of it.
module bezel() {
    difference() {
        union() {
            intersection() {
                scale(scaleFactor) bezelCutout(shrink = 2 * bezelFit / scaleFactor);
                shell(bezelCut = false);
            }
            bezelBalls();
        }
        screenHole();
    }
}

//Code

// the four pieces of the shell: name, colour, which side of each seam
quadName  = ["lowerleft", "lowerright", "upperleft", "upperright"];
quadColor = ["gray",      "green",      "blue",      "red"];
quadSide  = [[-1,-1],     [1,-1],       [-1,1],      [1,1]];

for (q = [0 : 3])
    if (part == "assembly" || part == "case" || part == quadName[q])
        multicolor(color = quadColor[q]) quadrant(quadSide[q][0], quadSide[q][1]);

if (part == "whole")                       multicolor(color = "gray")  vt100Case();

// the keyboard, halved down the middle for the printer
kbName  = ["kbleft",  "kbright"];
kbColor = ["orange",  "yellow"];
for (k = [0 : 1])
    if (part == "assembly" || part == "keyboard" || part == kbName[k])
        multicolor(color = kbColor[k]) keyboardHalf(k == 0 ? -1 : 1);

if (part == "assembly" || part == "bezel") multicolor(color = "black") bezel();
if (part == "assembly" || part == "panel") multicolor(color = "white") {
    if (layFlat) panelForPrinting() accessPanel();
    else                            accessPanel();
}
